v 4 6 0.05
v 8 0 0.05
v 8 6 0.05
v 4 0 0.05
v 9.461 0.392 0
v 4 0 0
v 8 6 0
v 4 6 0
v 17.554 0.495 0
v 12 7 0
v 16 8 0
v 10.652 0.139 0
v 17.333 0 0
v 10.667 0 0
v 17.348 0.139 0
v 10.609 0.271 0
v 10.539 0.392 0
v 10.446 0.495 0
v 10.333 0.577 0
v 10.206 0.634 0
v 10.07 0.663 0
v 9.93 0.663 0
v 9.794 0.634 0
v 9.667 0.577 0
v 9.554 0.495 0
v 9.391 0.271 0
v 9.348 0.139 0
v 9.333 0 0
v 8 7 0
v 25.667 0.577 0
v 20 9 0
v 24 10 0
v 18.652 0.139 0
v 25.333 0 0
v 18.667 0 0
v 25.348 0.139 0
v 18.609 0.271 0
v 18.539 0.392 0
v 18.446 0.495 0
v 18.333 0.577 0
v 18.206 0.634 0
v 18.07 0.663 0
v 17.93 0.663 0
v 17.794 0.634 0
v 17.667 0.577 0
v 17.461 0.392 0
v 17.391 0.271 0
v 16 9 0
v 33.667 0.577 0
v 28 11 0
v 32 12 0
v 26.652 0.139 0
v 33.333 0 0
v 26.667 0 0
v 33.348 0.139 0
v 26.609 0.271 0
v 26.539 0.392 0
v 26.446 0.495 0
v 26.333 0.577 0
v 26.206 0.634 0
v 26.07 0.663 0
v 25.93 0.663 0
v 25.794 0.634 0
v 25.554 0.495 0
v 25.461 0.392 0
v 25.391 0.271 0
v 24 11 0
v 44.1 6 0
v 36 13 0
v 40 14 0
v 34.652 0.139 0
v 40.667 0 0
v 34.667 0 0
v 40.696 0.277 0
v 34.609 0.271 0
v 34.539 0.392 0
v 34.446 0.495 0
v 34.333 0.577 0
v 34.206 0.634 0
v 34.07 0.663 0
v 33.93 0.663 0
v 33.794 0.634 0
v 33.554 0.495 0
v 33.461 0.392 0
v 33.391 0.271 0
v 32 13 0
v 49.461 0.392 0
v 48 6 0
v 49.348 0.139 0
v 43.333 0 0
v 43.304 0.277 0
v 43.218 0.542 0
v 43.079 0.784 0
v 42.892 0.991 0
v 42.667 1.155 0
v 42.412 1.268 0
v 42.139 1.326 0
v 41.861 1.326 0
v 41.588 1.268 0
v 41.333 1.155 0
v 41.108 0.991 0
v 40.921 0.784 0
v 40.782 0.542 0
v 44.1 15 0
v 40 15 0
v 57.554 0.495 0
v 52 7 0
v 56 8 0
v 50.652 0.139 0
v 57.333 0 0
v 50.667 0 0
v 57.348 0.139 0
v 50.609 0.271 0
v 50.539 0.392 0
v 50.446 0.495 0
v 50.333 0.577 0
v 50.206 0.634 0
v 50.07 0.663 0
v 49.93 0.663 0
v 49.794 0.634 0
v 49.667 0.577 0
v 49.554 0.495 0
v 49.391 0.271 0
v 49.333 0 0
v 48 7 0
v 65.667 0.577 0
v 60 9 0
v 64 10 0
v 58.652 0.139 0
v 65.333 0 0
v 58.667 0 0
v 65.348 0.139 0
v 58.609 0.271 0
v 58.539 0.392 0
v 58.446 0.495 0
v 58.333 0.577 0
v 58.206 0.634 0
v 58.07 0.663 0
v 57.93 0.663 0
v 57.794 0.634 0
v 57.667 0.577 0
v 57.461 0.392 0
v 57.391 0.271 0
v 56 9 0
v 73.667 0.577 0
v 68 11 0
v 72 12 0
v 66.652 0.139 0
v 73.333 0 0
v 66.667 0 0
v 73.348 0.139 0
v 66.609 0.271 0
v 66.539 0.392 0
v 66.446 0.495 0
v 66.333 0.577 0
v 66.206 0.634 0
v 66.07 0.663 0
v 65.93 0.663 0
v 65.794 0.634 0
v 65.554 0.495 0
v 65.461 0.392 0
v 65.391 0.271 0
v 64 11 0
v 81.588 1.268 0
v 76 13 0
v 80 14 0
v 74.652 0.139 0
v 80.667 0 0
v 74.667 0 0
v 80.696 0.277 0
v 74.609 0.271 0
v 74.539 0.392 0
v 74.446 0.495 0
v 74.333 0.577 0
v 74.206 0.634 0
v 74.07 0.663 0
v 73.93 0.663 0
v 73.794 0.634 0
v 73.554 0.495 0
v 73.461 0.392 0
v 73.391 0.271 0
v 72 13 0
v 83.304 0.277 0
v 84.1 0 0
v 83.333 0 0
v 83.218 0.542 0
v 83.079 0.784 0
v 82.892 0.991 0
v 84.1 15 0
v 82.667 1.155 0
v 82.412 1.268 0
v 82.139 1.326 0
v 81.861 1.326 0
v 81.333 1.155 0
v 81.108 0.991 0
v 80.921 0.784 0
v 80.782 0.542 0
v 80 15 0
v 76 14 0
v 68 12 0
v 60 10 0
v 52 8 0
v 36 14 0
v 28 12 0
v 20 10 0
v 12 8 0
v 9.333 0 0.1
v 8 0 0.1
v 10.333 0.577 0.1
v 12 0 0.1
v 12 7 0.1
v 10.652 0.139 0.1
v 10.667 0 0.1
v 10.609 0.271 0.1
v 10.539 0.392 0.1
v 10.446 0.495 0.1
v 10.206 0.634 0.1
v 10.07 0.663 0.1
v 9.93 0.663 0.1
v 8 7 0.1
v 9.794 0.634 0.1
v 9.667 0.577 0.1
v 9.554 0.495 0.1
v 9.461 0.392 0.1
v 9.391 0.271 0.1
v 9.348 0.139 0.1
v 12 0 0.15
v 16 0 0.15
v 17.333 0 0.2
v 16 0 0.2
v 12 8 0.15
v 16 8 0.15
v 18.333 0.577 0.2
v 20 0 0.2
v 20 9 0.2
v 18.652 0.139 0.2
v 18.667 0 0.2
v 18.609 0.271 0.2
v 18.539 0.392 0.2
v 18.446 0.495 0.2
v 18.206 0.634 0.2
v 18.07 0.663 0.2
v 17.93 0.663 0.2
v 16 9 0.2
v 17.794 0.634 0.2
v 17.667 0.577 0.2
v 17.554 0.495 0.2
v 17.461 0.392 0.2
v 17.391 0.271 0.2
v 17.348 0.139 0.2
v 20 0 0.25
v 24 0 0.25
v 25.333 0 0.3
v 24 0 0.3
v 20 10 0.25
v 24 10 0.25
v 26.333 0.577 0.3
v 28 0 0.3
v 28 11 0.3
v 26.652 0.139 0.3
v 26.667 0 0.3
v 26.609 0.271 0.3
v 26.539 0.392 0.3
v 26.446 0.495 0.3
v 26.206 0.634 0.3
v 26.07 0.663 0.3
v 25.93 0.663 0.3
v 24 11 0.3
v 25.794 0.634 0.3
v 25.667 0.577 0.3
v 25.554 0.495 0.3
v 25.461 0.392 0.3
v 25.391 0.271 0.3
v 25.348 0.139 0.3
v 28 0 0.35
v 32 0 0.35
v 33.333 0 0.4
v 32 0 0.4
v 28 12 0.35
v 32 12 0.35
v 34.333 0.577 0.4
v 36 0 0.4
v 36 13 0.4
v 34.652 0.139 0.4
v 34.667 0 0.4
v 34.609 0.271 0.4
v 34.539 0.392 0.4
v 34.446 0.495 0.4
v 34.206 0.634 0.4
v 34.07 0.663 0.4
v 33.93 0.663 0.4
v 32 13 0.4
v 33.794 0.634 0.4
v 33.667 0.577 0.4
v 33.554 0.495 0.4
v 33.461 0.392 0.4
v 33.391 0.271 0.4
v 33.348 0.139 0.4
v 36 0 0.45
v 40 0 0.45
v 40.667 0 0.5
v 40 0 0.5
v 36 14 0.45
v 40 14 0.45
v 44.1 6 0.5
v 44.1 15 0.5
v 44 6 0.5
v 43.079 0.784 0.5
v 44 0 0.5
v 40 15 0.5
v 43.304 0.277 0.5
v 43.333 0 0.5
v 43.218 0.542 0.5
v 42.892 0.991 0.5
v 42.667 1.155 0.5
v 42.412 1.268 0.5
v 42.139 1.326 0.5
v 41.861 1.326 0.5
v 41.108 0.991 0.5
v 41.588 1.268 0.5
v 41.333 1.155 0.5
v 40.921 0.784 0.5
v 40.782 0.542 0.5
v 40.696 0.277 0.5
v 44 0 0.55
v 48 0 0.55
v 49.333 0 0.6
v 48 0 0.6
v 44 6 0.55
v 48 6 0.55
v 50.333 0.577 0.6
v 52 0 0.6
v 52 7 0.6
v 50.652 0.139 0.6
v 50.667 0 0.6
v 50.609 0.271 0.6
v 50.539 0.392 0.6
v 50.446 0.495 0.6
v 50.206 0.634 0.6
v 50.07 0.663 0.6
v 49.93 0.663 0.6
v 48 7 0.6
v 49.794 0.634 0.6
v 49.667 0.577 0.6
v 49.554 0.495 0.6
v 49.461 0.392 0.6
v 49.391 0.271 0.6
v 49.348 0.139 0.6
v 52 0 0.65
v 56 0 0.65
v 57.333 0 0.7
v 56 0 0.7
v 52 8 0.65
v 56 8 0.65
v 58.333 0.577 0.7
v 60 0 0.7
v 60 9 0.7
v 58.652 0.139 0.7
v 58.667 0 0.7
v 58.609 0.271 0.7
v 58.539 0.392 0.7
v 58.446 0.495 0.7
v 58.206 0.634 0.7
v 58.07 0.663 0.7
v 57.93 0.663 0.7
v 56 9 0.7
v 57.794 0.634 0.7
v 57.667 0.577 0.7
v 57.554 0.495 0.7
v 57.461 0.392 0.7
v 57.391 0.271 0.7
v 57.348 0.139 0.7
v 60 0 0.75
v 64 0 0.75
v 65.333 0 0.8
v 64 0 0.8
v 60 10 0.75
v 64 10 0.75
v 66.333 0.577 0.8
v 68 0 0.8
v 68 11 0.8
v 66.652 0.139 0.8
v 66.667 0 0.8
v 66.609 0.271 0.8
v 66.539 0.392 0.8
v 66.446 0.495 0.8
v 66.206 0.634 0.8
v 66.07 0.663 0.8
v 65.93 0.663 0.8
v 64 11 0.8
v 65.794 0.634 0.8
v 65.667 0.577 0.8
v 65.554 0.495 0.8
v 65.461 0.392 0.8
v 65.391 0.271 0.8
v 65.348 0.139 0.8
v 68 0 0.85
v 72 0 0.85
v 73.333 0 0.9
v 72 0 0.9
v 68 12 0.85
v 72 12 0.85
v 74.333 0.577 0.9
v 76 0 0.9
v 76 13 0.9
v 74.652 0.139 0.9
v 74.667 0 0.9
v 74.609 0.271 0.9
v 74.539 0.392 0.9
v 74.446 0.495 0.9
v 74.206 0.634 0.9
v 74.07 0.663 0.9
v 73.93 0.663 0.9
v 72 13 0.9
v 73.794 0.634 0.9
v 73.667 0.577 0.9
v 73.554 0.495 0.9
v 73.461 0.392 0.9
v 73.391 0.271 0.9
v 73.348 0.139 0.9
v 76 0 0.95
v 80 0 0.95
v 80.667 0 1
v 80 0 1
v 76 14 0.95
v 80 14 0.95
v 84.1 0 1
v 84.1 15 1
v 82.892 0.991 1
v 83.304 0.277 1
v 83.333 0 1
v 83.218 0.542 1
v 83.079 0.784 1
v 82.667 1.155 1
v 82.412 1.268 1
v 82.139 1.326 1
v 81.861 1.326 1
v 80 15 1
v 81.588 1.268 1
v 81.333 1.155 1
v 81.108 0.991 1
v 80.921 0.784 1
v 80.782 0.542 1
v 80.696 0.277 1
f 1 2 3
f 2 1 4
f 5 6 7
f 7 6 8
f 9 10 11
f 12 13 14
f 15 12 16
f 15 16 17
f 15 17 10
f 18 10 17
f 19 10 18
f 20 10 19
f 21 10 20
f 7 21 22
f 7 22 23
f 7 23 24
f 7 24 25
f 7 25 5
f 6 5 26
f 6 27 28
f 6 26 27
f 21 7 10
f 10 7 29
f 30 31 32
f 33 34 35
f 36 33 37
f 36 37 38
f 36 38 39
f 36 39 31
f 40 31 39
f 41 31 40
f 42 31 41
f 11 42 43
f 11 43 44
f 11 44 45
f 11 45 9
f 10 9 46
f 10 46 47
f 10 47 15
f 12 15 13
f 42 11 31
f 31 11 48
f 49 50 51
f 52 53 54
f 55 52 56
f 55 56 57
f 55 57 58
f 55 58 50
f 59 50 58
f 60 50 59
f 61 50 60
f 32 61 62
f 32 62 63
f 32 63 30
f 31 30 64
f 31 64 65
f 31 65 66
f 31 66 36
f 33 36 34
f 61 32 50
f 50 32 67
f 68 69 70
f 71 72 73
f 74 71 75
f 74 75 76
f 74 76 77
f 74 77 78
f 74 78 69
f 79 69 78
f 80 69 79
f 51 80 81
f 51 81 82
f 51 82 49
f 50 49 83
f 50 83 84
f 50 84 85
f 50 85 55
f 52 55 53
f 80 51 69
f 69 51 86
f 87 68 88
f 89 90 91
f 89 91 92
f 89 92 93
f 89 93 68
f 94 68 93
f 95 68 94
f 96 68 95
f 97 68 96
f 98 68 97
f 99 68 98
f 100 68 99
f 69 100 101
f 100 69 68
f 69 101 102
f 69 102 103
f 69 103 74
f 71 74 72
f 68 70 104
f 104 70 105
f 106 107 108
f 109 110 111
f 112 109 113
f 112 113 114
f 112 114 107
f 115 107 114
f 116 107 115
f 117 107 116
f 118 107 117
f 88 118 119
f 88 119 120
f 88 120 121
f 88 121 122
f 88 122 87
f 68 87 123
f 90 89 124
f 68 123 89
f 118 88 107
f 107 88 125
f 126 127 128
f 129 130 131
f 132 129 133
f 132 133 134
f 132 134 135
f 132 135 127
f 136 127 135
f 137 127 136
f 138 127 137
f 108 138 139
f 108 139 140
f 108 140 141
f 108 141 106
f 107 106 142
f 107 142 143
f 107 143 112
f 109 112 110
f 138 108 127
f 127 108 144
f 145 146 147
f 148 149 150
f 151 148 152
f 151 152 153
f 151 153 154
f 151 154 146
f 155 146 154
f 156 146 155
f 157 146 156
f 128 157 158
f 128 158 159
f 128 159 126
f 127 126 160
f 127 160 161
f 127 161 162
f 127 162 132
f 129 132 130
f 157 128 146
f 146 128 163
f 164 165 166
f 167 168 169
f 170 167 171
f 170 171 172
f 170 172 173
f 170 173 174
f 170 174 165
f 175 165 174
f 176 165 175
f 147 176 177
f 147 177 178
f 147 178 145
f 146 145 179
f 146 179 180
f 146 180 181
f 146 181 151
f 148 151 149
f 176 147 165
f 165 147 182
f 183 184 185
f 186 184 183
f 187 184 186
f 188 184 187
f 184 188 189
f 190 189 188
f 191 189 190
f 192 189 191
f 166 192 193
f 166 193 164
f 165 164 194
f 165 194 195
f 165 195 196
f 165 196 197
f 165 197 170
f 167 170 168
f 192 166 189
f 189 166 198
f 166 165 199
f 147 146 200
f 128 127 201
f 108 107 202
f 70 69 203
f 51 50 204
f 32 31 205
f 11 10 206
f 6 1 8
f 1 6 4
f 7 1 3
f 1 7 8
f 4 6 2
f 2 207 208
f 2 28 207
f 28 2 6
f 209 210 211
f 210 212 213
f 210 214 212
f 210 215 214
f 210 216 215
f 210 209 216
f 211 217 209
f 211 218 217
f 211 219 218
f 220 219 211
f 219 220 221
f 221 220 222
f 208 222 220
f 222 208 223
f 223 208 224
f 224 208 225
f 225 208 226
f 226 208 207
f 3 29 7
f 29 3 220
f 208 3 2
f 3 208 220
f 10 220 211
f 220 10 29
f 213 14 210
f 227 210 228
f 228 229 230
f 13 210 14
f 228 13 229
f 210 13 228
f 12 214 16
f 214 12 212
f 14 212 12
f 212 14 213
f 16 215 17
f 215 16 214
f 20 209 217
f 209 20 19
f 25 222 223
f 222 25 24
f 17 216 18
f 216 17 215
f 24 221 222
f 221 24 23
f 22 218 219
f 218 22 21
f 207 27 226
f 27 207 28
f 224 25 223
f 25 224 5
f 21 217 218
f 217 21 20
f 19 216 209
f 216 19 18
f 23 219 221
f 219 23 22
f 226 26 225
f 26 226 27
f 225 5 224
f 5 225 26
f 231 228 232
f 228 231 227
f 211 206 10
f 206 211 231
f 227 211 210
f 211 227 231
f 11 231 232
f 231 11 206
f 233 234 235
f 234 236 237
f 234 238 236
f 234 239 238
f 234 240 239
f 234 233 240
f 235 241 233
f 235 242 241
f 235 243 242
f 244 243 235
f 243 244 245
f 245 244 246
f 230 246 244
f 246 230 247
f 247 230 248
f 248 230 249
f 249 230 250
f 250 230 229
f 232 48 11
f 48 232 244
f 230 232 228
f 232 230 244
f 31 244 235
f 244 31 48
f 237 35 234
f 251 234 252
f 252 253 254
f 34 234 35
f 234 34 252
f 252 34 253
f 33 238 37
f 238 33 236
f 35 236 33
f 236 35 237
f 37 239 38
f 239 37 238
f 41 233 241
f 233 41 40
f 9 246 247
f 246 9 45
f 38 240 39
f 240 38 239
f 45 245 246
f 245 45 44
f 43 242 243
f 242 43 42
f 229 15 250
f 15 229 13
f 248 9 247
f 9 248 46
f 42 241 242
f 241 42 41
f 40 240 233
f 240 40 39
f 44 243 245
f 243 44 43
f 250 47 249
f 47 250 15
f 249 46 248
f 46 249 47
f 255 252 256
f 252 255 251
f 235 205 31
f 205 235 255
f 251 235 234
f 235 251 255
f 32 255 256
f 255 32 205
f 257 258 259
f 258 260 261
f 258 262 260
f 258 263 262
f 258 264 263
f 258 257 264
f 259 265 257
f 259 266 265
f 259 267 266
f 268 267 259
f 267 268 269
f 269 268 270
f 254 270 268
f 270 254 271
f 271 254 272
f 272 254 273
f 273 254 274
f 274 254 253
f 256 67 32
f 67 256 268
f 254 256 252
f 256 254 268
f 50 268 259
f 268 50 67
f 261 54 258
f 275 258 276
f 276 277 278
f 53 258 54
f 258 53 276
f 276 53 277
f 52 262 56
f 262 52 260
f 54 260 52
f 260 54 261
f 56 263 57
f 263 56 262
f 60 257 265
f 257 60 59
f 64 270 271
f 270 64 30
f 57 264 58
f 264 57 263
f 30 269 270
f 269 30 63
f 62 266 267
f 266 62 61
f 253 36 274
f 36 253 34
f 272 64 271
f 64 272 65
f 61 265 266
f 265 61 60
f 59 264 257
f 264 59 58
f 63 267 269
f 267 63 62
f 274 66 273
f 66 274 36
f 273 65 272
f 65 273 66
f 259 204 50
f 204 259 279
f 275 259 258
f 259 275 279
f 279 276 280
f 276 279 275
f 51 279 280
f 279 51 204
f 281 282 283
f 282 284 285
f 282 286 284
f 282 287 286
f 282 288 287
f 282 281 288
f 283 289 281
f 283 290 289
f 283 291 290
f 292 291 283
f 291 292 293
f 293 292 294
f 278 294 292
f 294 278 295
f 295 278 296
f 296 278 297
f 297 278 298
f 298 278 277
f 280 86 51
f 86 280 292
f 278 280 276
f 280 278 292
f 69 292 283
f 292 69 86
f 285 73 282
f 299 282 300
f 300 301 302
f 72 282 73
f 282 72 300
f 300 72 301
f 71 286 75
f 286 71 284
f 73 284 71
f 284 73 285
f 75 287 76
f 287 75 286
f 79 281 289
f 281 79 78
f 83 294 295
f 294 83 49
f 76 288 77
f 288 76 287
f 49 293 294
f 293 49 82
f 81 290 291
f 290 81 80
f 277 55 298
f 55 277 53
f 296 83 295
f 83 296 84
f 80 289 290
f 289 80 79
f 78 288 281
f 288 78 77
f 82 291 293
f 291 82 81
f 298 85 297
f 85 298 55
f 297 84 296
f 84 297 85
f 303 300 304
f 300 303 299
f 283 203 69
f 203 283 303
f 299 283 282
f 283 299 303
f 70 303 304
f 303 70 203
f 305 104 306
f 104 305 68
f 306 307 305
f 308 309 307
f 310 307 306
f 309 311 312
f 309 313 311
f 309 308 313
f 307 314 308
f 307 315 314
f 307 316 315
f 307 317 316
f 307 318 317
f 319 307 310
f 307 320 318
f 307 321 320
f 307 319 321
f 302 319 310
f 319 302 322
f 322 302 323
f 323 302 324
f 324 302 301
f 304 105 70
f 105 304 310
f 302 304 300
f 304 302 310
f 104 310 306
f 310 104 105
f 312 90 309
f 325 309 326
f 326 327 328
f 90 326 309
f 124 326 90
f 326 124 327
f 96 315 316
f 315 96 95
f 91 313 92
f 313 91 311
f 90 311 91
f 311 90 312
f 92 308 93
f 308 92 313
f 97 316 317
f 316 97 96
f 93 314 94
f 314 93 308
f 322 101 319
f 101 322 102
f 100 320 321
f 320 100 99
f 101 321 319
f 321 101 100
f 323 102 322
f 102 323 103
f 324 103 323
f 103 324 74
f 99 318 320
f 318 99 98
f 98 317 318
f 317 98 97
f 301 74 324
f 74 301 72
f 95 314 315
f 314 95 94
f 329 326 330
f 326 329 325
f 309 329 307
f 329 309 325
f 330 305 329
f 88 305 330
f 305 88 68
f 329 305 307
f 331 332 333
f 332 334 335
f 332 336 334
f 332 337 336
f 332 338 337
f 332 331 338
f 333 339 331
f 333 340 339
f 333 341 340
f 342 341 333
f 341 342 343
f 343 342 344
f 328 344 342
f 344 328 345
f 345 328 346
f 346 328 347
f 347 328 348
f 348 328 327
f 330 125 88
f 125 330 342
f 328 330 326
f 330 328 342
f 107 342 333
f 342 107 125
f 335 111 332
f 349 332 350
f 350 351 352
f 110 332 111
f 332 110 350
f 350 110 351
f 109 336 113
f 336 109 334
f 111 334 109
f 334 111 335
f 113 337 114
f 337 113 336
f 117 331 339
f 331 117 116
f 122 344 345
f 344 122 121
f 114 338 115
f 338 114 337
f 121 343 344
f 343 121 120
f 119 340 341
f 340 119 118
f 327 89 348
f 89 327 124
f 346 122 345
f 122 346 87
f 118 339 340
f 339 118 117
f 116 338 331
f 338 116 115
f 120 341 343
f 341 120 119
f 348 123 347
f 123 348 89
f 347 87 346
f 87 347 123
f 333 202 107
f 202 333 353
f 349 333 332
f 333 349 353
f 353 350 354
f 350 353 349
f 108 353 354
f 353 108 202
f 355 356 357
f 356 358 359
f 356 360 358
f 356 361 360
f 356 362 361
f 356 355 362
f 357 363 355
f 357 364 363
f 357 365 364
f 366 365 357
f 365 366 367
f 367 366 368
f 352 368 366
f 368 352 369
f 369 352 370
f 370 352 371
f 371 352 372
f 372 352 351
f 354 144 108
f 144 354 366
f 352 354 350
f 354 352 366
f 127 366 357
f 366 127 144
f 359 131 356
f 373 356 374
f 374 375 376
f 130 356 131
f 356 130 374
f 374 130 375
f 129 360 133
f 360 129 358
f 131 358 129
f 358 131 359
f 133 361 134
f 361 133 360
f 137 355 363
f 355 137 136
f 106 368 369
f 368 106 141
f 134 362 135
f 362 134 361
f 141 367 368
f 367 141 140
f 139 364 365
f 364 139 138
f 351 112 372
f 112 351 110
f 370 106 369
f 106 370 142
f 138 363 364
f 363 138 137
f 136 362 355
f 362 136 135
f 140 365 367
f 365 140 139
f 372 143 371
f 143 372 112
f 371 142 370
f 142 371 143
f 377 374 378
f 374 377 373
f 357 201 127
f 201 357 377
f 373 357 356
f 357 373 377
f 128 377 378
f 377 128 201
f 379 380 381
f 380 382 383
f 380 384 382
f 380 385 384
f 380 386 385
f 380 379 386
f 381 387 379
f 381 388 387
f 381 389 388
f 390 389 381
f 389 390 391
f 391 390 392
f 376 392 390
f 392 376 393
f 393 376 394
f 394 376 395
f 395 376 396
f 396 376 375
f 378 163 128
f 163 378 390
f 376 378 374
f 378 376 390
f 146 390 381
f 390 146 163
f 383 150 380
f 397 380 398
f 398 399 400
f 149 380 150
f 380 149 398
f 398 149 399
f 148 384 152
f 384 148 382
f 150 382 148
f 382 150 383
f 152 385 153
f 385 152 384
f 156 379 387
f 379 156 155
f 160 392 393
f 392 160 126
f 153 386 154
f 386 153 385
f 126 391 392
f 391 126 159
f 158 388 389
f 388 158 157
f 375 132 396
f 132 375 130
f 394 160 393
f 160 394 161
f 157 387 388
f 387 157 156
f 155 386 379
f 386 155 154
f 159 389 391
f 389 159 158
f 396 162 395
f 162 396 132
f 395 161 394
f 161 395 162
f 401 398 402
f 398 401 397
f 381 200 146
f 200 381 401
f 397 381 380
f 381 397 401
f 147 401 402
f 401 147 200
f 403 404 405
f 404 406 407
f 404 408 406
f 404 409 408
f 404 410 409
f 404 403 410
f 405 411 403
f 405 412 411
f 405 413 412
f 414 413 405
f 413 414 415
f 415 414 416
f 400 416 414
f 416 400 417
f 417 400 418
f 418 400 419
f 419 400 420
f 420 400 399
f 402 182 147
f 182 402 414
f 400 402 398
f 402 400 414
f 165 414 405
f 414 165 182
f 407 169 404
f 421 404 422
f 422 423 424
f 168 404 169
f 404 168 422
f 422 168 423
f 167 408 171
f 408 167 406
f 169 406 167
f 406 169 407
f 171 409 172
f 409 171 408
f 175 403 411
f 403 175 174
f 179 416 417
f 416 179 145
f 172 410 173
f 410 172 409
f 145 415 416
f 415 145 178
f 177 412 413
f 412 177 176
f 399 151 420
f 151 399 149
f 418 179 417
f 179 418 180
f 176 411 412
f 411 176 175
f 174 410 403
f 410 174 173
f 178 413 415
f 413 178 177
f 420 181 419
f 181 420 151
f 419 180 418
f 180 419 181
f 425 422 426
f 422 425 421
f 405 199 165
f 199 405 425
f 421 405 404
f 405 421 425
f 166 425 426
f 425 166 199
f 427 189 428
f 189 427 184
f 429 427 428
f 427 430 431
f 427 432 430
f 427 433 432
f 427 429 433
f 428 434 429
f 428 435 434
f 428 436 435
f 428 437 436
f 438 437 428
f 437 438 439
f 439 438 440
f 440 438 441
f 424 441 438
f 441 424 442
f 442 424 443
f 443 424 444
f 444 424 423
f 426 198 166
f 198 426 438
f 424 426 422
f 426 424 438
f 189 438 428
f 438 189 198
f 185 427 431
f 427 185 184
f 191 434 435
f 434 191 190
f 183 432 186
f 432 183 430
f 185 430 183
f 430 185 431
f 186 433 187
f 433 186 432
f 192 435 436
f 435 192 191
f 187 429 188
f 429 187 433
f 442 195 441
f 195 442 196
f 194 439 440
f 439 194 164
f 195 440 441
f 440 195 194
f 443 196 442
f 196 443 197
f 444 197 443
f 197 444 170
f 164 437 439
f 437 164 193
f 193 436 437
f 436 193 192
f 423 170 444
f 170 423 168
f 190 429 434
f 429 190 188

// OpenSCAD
// start thickness
_1_start = 0.0;

// thickness increment between samples
_2_increment = 0.05;

// end thickness
_3_end = 1;

// width of each sample
_4_width = 4; // [1:10]

// minimum height of each sample (varies from 
_5_height = 6; // [1:50]


////////////////////////////////////////////////////////////


module layerTest(start, increment, end, width, length) {
	count = round((end-start)/increment)+1;
	radius = width/3;
	eps = 0.1;
	union() {
		for (index = [0:count-1]) {
			assign (h = start + increment * index) {
				echo(h);
				if (h > 0) {
					translate([index * width,0,0]) {
						difference() {
							cube(size=[width+eps, length + (index-1)%10, h]);

							if (index%10 == 0) {
								translate([width/2,0,0]) {
									cylinder(r=radius, h=end*3, center=true, $fn=30);
								}
							} else if (index%2 == 0) {
								translate([width/2,0,0]) {
									cylinder(r=radius/2, h=end*3, center=true, $fn=30);
								}
							}
						}
					}
				}
			}
		}
	}

}

layerTest(_1_start,_2_increment,_3_end,_4_width,_5_height);
